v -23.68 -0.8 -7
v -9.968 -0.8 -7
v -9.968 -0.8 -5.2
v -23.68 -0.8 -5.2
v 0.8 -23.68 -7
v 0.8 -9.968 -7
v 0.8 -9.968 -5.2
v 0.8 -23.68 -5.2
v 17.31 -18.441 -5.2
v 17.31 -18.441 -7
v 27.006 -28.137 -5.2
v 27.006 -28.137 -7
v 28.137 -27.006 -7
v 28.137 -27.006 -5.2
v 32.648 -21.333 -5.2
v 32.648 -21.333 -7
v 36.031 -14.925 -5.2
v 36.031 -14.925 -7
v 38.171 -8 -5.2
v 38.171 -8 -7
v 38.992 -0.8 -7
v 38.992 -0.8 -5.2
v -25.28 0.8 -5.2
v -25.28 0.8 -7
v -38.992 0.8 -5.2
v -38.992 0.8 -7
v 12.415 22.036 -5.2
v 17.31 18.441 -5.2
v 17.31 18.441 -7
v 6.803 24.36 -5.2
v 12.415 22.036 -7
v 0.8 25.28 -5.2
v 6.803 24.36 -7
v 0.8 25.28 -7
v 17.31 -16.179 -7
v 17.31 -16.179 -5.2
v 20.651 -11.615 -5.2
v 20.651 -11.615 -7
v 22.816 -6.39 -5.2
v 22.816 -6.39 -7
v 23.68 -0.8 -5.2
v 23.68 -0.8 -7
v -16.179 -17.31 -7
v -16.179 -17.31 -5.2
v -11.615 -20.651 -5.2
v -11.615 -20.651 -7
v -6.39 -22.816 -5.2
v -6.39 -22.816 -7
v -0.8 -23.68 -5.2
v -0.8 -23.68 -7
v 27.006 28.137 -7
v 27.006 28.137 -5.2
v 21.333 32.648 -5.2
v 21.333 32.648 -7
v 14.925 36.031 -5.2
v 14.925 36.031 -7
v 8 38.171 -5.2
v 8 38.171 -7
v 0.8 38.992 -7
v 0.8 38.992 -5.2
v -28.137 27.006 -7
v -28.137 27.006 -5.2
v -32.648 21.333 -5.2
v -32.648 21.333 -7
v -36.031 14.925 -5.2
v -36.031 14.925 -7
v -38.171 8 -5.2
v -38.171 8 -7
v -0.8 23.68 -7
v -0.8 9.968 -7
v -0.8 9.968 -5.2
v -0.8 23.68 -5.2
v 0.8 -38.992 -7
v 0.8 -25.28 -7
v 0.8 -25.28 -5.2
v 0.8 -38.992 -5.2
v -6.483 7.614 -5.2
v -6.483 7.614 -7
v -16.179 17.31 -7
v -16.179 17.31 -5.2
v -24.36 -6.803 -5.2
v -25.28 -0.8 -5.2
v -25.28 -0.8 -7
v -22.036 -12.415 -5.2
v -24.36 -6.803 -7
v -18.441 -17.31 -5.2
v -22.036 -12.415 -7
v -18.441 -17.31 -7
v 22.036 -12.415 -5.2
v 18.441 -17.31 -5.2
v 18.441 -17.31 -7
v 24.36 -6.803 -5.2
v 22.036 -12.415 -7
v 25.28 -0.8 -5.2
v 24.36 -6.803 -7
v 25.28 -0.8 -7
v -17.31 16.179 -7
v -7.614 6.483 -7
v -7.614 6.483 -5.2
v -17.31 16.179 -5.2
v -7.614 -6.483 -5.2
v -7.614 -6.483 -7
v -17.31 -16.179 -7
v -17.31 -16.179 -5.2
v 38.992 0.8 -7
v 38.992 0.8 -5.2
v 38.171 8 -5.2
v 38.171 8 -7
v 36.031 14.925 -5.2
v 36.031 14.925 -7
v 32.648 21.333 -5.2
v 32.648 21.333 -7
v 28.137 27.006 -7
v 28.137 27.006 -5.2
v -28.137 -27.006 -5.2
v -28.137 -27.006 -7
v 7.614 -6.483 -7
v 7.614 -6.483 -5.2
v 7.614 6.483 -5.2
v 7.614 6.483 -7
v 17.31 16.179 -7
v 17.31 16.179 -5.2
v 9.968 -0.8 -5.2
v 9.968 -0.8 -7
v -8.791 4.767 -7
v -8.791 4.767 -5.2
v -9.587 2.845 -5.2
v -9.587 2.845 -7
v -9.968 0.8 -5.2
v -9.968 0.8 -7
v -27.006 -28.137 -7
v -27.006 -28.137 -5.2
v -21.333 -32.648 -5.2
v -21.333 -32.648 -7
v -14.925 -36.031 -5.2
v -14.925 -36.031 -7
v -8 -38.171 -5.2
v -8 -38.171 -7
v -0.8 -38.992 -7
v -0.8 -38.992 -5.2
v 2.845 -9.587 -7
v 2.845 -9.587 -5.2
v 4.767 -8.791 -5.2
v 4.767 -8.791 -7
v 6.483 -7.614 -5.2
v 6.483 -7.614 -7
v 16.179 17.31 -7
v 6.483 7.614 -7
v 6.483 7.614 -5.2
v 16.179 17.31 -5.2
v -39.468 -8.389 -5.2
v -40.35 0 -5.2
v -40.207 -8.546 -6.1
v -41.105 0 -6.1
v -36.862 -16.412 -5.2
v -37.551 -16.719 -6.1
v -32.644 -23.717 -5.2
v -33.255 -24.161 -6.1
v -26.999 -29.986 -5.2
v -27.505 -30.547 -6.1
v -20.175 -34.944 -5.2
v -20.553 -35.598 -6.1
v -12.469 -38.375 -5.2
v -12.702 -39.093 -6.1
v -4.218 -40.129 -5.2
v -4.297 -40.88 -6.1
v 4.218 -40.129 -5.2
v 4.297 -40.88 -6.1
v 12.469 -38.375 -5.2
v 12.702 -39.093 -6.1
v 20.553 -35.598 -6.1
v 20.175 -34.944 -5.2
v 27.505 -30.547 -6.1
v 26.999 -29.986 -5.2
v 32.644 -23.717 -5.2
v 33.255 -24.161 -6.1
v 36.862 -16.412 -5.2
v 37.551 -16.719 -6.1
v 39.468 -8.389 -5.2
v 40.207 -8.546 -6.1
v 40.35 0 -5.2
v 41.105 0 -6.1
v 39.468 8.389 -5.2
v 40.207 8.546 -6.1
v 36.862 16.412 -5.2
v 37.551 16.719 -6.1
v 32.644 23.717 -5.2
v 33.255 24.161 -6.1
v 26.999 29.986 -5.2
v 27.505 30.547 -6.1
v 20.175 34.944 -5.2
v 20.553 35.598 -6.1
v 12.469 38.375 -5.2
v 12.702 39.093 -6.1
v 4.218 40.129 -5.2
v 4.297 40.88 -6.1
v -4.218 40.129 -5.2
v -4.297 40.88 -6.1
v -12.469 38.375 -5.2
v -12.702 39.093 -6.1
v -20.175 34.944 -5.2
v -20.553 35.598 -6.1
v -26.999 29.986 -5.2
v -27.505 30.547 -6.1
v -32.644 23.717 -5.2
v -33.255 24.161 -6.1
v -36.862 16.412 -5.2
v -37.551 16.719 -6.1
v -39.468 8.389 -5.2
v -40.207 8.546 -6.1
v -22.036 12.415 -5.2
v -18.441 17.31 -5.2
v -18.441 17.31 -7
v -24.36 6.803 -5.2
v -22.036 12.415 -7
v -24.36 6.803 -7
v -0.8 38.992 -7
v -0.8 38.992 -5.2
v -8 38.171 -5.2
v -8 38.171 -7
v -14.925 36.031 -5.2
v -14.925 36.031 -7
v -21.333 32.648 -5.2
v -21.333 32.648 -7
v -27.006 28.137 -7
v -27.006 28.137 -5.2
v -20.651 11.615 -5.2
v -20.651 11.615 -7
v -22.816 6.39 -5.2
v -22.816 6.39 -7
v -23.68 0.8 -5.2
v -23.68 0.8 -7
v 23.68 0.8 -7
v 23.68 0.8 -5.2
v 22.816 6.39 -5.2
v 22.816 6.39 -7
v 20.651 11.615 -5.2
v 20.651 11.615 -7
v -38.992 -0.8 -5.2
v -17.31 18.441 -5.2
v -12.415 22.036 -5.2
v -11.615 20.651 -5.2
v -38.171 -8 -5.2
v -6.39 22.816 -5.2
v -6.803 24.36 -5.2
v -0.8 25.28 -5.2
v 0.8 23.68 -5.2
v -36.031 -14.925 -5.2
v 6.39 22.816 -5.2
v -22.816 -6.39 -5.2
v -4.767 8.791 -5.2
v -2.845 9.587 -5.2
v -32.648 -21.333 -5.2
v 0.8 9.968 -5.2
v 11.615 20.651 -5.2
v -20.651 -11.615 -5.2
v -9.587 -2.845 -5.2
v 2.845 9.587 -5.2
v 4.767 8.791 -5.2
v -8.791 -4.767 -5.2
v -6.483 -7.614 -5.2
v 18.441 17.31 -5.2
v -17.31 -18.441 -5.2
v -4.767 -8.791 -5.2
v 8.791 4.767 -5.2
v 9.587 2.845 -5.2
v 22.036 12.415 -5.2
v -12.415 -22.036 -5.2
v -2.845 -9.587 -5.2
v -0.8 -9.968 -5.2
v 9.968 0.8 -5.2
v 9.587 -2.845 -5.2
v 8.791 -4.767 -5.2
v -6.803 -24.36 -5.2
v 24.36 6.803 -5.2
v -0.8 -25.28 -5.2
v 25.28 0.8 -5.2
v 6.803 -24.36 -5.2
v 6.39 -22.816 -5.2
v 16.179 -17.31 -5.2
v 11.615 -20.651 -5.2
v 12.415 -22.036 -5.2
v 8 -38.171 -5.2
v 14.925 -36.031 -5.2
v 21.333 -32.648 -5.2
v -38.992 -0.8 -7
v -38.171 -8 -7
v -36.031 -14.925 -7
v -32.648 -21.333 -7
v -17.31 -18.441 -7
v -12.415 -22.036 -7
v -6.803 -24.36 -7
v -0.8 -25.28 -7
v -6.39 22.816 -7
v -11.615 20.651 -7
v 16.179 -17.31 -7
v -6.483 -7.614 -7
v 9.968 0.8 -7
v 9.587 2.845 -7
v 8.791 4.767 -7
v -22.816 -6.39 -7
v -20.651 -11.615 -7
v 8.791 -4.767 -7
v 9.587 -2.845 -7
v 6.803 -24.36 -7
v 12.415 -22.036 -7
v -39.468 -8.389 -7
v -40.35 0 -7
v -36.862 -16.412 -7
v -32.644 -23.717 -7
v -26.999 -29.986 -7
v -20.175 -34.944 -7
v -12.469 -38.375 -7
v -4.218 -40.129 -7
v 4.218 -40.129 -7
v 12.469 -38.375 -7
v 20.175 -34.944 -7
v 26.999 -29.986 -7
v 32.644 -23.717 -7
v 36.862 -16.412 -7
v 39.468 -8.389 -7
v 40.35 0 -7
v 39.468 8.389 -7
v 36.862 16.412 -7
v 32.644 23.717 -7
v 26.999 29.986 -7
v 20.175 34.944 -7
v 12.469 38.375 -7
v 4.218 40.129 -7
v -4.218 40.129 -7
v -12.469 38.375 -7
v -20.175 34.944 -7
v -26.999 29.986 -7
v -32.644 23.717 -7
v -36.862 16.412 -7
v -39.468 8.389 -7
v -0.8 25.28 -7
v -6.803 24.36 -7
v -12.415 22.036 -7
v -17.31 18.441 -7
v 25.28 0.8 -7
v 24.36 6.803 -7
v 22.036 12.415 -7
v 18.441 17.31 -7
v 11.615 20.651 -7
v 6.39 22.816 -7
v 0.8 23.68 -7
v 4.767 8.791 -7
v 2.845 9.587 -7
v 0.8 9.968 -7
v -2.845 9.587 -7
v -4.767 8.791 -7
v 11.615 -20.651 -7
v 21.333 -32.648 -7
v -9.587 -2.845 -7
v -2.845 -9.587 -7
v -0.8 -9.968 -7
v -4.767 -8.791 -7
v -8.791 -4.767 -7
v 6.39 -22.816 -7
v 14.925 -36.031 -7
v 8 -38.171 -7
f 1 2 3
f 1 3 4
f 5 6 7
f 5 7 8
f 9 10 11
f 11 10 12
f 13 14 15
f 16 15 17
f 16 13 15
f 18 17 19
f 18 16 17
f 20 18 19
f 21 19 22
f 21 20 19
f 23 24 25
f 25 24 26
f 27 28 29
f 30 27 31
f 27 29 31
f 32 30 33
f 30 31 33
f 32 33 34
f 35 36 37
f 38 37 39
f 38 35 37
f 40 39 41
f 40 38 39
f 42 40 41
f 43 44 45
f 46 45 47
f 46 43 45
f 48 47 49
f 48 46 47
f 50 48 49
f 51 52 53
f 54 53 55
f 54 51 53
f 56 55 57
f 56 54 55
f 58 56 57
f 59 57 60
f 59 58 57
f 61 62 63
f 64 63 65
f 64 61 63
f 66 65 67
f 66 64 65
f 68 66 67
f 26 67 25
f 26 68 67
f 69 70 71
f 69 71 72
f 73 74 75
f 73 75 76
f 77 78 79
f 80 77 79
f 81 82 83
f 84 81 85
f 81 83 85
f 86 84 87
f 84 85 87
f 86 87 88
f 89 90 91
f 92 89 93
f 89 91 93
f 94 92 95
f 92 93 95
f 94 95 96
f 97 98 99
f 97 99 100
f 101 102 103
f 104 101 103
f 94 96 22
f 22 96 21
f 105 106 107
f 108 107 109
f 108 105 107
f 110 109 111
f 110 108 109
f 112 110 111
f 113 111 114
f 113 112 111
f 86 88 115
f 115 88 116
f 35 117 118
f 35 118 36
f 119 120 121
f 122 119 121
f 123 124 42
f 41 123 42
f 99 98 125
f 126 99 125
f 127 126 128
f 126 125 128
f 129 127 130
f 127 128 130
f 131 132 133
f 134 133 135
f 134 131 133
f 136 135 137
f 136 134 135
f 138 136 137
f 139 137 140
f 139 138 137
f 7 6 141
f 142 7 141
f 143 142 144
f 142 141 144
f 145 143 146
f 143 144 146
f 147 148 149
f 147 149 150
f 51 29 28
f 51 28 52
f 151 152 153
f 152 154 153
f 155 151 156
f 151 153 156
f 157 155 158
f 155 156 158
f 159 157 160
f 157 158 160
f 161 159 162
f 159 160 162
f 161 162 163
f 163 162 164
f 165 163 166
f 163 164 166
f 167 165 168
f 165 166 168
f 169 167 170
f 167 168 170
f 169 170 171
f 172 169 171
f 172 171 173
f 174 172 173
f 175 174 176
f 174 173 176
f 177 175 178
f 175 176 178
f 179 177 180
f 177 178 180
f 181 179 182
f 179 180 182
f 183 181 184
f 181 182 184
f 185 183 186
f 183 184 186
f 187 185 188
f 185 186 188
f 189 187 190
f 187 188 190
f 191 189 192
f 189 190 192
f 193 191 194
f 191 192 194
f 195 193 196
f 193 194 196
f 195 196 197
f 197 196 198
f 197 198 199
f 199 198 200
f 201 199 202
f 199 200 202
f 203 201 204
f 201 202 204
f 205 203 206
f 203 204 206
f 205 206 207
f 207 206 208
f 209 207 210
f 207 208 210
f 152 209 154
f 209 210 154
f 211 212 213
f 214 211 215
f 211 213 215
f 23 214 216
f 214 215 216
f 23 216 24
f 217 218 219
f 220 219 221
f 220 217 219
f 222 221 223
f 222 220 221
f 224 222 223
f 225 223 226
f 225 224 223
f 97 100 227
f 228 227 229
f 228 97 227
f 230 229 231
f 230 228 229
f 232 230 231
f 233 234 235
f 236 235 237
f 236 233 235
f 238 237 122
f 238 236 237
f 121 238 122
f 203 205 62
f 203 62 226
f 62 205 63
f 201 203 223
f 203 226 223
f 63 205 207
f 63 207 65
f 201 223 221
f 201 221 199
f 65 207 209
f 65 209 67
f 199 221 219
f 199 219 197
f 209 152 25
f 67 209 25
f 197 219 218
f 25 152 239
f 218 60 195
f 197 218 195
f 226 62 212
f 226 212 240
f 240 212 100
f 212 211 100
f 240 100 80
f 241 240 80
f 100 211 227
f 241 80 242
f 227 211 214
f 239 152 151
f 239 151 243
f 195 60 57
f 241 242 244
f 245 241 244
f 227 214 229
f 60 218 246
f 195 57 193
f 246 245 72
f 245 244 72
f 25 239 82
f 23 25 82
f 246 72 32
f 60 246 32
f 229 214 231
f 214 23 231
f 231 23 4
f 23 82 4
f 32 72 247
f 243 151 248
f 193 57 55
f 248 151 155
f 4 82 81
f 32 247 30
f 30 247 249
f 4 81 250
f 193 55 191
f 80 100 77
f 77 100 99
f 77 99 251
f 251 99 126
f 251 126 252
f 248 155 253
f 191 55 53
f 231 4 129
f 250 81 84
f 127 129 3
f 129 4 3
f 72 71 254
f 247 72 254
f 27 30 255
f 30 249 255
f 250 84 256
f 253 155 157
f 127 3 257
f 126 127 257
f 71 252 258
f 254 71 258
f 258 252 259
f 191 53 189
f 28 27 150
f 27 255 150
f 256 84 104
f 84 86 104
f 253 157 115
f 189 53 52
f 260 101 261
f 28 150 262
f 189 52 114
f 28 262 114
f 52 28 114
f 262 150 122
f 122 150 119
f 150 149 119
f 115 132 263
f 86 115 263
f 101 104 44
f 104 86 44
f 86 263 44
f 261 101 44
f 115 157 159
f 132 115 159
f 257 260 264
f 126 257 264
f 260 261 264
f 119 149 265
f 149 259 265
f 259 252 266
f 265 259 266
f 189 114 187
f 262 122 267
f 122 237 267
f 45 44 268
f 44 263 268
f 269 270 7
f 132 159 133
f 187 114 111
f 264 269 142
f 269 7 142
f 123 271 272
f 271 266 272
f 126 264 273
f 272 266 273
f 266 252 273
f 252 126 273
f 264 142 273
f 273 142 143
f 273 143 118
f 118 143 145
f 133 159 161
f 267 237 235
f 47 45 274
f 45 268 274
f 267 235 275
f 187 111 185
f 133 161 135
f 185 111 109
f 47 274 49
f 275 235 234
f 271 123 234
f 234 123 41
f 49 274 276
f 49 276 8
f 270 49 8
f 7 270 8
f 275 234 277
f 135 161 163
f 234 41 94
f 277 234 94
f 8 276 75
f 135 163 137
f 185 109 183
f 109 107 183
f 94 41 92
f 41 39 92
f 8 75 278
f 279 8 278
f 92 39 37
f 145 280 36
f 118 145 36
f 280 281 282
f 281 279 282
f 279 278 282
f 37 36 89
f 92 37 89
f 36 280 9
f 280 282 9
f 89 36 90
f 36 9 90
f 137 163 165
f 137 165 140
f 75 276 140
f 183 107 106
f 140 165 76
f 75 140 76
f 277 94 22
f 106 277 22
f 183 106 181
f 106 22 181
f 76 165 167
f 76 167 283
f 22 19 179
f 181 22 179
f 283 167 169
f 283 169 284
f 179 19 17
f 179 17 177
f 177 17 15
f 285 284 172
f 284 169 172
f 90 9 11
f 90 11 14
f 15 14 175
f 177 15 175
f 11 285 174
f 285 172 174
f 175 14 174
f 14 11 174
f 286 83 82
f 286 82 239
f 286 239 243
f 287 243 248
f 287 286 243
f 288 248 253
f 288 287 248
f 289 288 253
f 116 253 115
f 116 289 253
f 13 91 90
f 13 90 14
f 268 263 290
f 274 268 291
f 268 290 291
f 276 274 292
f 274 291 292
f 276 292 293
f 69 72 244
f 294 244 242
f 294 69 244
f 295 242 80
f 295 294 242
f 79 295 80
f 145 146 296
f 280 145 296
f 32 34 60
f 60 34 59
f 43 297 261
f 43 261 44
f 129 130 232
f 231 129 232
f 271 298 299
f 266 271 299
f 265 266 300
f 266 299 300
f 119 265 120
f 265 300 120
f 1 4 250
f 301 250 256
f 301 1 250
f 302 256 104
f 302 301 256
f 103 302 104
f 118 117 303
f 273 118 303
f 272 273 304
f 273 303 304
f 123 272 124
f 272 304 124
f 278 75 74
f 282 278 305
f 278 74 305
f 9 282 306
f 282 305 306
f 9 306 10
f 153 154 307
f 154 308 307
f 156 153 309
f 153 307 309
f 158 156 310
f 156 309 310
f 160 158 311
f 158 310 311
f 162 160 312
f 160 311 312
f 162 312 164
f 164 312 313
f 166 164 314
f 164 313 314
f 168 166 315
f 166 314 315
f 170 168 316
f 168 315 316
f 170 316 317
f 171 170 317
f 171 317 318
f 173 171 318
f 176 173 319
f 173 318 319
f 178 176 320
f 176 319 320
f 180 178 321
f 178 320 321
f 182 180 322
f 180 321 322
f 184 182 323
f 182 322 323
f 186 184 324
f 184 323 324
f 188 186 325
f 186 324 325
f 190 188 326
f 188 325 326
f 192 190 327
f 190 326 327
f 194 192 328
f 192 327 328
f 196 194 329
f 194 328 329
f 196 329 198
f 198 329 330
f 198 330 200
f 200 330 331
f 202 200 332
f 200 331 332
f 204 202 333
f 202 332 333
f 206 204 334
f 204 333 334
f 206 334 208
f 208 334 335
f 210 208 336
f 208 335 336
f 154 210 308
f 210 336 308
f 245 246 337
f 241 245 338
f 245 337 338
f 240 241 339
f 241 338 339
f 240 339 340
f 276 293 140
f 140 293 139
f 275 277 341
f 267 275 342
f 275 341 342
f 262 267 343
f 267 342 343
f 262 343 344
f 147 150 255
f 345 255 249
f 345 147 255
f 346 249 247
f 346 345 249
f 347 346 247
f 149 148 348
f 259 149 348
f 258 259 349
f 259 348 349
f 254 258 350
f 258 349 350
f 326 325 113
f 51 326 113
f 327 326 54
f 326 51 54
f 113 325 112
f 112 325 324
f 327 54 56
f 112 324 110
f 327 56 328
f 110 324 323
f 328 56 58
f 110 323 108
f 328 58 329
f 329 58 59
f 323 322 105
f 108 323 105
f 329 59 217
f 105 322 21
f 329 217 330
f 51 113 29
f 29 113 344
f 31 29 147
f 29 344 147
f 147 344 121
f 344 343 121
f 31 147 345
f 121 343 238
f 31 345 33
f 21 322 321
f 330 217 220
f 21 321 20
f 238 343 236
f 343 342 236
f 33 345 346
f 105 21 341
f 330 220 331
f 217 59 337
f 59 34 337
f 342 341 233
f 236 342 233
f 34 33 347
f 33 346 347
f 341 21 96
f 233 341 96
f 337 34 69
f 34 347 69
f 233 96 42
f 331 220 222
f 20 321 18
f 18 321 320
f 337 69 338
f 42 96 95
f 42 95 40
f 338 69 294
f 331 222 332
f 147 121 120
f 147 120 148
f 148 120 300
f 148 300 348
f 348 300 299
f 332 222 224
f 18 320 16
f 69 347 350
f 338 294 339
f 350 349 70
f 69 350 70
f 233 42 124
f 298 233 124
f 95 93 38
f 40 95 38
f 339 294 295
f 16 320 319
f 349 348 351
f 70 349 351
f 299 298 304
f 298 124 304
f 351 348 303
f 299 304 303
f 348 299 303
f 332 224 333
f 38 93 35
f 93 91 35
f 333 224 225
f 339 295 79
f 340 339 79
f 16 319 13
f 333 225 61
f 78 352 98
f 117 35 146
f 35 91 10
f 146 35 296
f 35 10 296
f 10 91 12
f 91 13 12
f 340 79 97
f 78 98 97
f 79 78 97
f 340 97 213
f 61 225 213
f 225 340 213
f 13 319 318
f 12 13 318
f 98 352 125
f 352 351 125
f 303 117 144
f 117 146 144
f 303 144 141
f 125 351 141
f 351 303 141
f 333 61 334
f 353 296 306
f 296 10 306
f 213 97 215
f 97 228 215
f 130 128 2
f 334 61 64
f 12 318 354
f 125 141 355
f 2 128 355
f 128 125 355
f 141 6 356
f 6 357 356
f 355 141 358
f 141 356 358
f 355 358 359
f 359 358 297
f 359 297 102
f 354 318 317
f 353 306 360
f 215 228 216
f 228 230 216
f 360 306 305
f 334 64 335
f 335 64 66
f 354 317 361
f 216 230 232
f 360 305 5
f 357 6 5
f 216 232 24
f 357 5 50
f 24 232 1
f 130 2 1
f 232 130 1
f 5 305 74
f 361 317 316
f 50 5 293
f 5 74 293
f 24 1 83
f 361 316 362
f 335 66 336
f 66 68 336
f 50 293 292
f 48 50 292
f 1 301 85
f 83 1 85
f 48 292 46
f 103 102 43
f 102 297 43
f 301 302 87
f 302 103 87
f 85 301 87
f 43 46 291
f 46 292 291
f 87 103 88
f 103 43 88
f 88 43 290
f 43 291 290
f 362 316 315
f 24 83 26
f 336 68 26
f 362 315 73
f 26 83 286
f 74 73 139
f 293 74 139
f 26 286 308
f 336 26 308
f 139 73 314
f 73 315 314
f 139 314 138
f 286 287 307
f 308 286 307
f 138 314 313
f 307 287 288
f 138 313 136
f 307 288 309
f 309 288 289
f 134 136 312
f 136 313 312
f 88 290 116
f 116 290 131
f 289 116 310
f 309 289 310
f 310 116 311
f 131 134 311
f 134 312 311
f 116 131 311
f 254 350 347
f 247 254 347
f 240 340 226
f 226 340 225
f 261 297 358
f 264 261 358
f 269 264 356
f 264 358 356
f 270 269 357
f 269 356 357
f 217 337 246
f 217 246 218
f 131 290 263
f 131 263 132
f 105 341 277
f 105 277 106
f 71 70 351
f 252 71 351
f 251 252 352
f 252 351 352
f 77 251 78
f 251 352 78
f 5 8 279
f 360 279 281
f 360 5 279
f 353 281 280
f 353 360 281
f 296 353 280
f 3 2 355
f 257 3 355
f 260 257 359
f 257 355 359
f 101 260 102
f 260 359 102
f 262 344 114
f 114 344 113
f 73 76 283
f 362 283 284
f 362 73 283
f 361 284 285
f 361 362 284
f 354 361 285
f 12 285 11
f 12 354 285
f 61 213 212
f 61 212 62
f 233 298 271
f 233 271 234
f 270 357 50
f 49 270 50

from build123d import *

# Parameters (mm, degrees)
POCKET004_DEPTH       = 234.354933
POLARPATTERN001_COUNT = 8


with BuildPart() as part:
    # Sketch017 → Revolution (revolve)
    with BuildSketch(Plane.XZ):
        Polygon((-40.35, -5.2), (-41.10519, -6.1), (-40.35, -7), (0, -7), (0, -5.2), align=None)
    revolve(axis=Axis((0, 0, 0), (0, 0, 1)))

    # Sketch018 → Pocket004 (cut, through all)
    with BuildSketch(Plane.XY.offset(-7)):
        with BuildLine():
            Line((0.8, 9.967949), (0.8, 23.679871))
            ThreePointArc((16.178512, 17.309883), (9.067064, 21.88983), (0.8, 23.679871))
            Line((6.482719, 7.614089), (16.178512, 17.309883))
            ThreePointArc((6.482719, 7.614089), (3.826834, 9.238795), (0.8, 9.967949))
        make_face()
        with BuildLine():
            ThreePointArc((17.309883, 18.441254), (9.679031, 23.367248), (0.8, 25.279871))
            Line((0.8, 25.279871), (0.8, 38.991794))
            ThreePointArc((27.005677, 28.137047), (14.924654, 36.031302), (0.8, 38.991794))
            Line((17.309883, 18.441254), (27.005677, 28.137047))
        make_face()
    pocket004 = extrude(amount=POCKET004_DEPTH, mode=Mode.SUBTRACT)

    # PolarPattern001: Pocket004 ×8 about axis
    polarpattern001_axis = Axis((0, 0, -7), (0, 0, 1))
    for i in range(1, POLARPATTERN001_COUNT):
        add(pocket004.rotate(polarpattern001_axis, i * 360 / POLARPATTERN001_COUNT), mode=Mode.SUBTRACT)


solid = part.part
